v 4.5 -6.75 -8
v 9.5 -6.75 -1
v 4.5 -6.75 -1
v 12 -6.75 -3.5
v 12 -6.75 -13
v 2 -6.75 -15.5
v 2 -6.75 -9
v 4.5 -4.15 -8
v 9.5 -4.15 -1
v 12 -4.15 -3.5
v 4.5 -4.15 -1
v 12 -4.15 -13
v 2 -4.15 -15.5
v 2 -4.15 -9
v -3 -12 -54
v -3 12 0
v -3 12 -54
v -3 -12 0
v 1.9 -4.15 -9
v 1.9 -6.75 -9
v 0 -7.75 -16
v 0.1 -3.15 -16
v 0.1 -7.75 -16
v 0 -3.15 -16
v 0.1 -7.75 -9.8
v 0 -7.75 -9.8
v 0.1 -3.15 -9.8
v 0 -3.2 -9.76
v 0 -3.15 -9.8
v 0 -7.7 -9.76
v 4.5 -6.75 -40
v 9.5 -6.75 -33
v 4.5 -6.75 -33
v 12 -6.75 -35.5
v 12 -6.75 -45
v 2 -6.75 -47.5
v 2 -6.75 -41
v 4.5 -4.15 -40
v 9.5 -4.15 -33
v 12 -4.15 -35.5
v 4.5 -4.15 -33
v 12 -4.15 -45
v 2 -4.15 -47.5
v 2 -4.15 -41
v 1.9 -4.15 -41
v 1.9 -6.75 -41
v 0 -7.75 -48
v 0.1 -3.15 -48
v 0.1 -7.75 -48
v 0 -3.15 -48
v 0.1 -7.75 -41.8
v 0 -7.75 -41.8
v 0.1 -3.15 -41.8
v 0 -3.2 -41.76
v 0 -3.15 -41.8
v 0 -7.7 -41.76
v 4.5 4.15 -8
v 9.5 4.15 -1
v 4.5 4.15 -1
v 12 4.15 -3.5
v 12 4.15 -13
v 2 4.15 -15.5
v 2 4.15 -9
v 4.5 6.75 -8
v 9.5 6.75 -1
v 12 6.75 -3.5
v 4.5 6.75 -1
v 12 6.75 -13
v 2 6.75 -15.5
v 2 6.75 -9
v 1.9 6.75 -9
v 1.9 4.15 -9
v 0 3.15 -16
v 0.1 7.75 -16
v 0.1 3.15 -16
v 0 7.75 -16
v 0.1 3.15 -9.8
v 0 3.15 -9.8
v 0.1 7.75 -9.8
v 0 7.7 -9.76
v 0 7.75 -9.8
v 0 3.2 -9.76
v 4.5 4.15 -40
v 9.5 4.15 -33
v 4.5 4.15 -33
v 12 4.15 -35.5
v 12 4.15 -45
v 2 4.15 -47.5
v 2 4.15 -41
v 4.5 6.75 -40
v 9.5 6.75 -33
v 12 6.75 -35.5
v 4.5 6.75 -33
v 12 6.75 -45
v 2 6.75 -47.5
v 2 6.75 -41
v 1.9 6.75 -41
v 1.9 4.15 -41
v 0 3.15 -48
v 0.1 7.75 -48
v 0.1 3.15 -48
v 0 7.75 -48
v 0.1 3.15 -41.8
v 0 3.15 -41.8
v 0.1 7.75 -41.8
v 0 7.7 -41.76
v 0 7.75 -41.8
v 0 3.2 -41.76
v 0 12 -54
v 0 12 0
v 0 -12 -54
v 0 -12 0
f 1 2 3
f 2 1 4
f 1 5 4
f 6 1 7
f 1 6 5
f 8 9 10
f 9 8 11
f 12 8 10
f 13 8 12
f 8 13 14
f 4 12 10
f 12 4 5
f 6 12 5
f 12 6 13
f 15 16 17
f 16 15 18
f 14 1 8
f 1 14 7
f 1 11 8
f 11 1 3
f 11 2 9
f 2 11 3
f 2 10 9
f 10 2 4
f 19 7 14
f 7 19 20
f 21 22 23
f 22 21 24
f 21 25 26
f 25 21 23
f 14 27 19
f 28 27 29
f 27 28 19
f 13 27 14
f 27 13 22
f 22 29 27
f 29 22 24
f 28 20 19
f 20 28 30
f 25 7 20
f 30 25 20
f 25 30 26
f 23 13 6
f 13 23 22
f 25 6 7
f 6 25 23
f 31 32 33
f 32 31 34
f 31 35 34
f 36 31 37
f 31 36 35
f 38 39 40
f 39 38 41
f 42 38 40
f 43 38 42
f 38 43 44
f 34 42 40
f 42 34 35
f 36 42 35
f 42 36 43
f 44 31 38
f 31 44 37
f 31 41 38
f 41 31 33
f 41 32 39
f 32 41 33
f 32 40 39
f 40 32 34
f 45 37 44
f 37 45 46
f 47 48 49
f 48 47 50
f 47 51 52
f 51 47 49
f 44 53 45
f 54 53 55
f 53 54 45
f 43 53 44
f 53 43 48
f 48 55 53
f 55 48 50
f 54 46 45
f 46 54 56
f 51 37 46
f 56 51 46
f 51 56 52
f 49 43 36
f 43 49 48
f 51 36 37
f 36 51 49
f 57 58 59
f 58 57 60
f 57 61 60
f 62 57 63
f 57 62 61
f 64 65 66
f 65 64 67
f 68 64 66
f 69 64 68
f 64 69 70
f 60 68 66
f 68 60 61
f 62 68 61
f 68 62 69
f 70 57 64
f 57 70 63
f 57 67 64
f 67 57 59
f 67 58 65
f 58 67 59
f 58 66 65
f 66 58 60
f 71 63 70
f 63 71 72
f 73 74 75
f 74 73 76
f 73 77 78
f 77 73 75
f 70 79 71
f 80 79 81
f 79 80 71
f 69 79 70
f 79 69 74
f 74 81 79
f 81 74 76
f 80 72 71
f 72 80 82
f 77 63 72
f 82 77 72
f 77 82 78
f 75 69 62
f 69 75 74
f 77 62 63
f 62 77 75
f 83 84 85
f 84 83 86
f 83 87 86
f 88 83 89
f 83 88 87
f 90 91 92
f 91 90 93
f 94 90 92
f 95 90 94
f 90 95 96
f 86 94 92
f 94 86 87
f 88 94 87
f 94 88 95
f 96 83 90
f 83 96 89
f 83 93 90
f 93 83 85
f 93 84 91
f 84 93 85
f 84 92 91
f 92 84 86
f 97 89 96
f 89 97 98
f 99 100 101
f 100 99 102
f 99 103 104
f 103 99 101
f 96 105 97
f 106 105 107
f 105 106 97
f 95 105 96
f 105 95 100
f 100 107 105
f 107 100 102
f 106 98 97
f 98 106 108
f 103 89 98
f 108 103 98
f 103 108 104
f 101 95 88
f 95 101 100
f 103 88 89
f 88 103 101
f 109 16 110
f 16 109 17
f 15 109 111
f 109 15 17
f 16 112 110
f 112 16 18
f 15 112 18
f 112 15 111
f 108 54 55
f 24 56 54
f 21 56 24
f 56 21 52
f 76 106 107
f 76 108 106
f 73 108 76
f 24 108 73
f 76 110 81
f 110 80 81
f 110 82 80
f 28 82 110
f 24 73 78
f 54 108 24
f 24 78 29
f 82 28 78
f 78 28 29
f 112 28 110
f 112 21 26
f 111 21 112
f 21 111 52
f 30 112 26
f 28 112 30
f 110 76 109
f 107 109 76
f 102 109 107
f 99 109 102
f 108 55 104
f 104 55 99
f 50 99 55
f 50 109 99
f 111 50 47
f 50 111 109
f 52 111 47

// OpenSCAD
/* ========================================================================== 

   Elfa Shelf Bracket Model for 3D Printing
   Designed by Notydesign
   License: CC BY-NC-SA 4.0 (https://creativecommons.org/licenses/by-nc-sa/4.0/)
   Source: https://github.com/Noty-design/Parametric-designs
   
   Description: Elfa shelf bracket with customizable parameters for number of columns, 
   teeth, and dimensions.

    This file is intentionally heavily commented so future parameter and geometry
   changes are easier to make safely.
   ========================================================================== */ 



/* [Orientation] */
model_rotation_x = 180; // [-360:1:360]
model_rotation_y = 0; // [-360:1:360]
model_rotation_z = 90; // [-360:1:360]

/* [Horizontal Layout] */
number_of_columns = 1;            // Number of vertical standards (skenor) to mount to
column_spacing_x = 85;            // Center-to-center distance between the columns (mm)

/* [Elfa Slot Spacing (Horizontal)] */
// Avstånd mellan insidorna på de två krokarna (mm)
tooth_inner_distance = 8.3;  
// Avstånd mellan utsidorna på de två krokarna (mm)
tooth_outer_distance = 13.5;  

/* [Information Display] */
// Visa uträknade mått som 3D-text ovanför modellen (stäng av innan utskrift)
show_measurement_text = false;

/* [Elfa Mount Settings] */
number_of_teeth = 2;              // Number of teeth (vertical hooks) per column
bracket_width_per_column = 24;    // The base width of the backplate covering one column group
backplate_thickness = 3;

/* [Strength Optimization] */
// How deep the hooks penetrate interiorly (mm)
tooth_embed_depth = 3;     
// Chamfer/fillet radius at the base of the hook inside the backplate (mm)
tooth_root_chamfer = 2.5;    

/* [Slicer Layer Overlap Optimization] */
// To prevent the slicer from creating a weak flat layer joint, a 3D foundation taper forces intersecting perimeters.
hook_base_width_fillet = 1;     // Taper lateral width left/right (adds total width at surface)
hook_base_height_fillet = 0;  // Taper vertically up/down along the backplate
hook_base_fillet_depth = 2;   // Length of taper transitioning outwards into the main hook

/* [Spacing & Height] */
tooth_pitch_y = 32;           // Standard Elfa pitch vertically (Center-to-Center distance)
tooth_vertical_offset = 1;   // Distance from bottom of bracket to first tooth
bracket_top_margin = 21;      // Margin above the top tooth

/* [Hook Profile (Elfa Style)] */
tooth_depth = 12;             // Depth penetrating the wall standard
tooth_top_y_front = 15;       // Front top height of the hook
tooth_top_y_back = 12;        // Sloped rear top height for insertion
tooth_gap_size = 20;          // Avståndet MELLAN en tands botten och nästa tands topp
notch_depth = 4.5;              // Clearance for standard wall thickness
notch_distance_from_bottom = 7; // Avstånd från krokens lägsta spets upp till hacket (vilar på skenan)
base_bottom_y = 8.8;            // Bottom angle thickness matching notch
hook_tip_chamfer = 2.5;       // Angled tip for smoother insertion

/* [Appearance] */
bracket_color = "#4682B4"; // SteelBlue
text_color = "#FFFFFF";    // White

// --- Calculations ---
tooth_width = (tooth_outer_distance - tooth_inner_distance) / 2;
calculated_tooth_pitch_x = tooth_inner_distance + tooth_width;

// Räkna ut totala höjden på tanden baserat på pitch och gap
calculated_tooth_total_height = tooth_pitch_y - tooth_gap_size;

// Auto-calculate structural dimensions
bracket_height = tooth_vertical_offset + ((number_of_teeth - 1) * tooth_pitch_y) + bracket_top_margin;
total_bracket_width = (number_of_columns - 1) * column_spacing_x + bracket_width_per_column;

rotate([model_rotation_x, model_rotation_y, model_rotation_z]) {
    if (show_measurement_text) {
        color(text_color)
        translate([0, 0, bracket_height + 5])
        rotate([90, 0, 0])
        linear_extrude(1)
        union() {
            text(str("Tandens Bredd: ", tooth_width, " mm"), size = 2.5, halign = "center", valign = "bottom");
            translate([0, -4, 0])
                text(str("Beraknad Tandhojd: ", calculated_tooth_total_height, " mm"), size = 2.5, halign = "center", valign = "bottom");
        }
    }

    color(bracket_color)
    union() {
        // Main solid support backplate spanning across all columns
        translate([-total_bracket_width/2, -backplate_thickness, 0])
            cube([total_bracket_width, backplate_thickness, bracket_height]);

        // Generate hook groups for each column
        for (col = [0 : number_of_columns - 1]) {
            x_col_offset = (col - (number_of_columns - 1) / 2) * column_spacing_x;
            
            translate([x_col_offset, 0, 0]) {
                // Left reinforced tooth column
                translate([-calculated_tooth_pitch_x/2, 0, 0])
                    tooth_column();

                // Right reinforced tooth column
                translate([calculated_tooth_pitch_x/2, 0, 0])
                    tooth_column();
            }
        }
    }
}

module tooth_column() {
    // Lägsta punkten på kroken i förhållande till toppkanten i Y (Depth)
    hook_bottom_z = tooth_top_y_back - calculated_tooth_total_height;
    // Uträknat Z-värde för hacket baserat på avståndet från krokens botten
    actual_notch_z = hook_bottom_z + notch_distance_from_bottom;
    
    for (i = [0 : number_of_teeth - 1]) {
        z_pos = tooth_vertical_offset + (i * tooth_pitch_y);
        
        translate([0, 0, z_pos]) {
            // 1. The core constant-thickness hook profile
            // Polygon X -> Depth (Y), Polygon Y -> Height (Z)
            rotate([90, 0, 90])
            linear_extrude(height=tooth_width, center=true)
            polygon([
                [-tooth_embed_depth, base_bottom_y - tooth_root_chamfer], 
                [0, base_bottom_y],                                       
                [notch_depth, actual_notch_z],                              
                [notch_depth, hook_bottom_z],                               
                [tooth_depth - hook_tip_chamfer, hook_bottom_z],            
                [tooth_depth, hook_bottom_z + hook_tip_chamfer],            
                [tooth_depth, tooth_top_y_back],                          
                [0, tooth_top_y_front],                                   
                [-tooth_embed_depth, tooth_top_y_front + tooth_root_chamfer] 
            ]);
            
            // 2. The 3D Tapered Foundation for Slicer Adhesion
            // Gradually slopes from a widened base footprint down to the bare hook shape.
            if (hook_base_fillet_depth > 0) {
                y_target = hook_base_fillet_depth;
                
                // Interpolate matching heights to follow the exact slopes of the hook profile
                t_bottom = y_target / notch_depth;
                z_bottom_taper = base_bottom_y * (1 - t_bottom) + actual_notch_z * t_bottom;
                
                t_top = y_target / tooth_depth;
                z_top_taper = tooth_top_y_front * (1 - t_top) + tooth_top_y_back * t_top;
                
                hull() {
                    // Wide foundation base deeply bonded with the backplate surface
                    rotate([90, 0, 90])
                    linear_extrude(height=tooth_width + hook_base_width_fillet*2, center=true)
                    polygon([
                        [-0.1, base_bottom_y - hook_base_height_fillet],
                        [0.1, base_bottom_y - hook_base_height_fillet],
                        [0.1, tooth_top_y_front + hook_base_height_fillet],
                        [-0.1, tooth_top_y_front + hook_base_height_fillet]
                    ]);
                    
                    // Merging smoothly into the exact hook dimensions at 'y_target'
                    rotate([90, 0, 90])
                    linear_extrude(height=tooth_width, center=true)
                    polygon([
                        [y_target - 0.1, z_bottom_taper],
                        [y_target, z_bottom_taper],
                        [y_target, z_top_taper],
                        [y_target - 0.1, z_top_taper]
                    ]);
                }
            }
        }
    }
}
